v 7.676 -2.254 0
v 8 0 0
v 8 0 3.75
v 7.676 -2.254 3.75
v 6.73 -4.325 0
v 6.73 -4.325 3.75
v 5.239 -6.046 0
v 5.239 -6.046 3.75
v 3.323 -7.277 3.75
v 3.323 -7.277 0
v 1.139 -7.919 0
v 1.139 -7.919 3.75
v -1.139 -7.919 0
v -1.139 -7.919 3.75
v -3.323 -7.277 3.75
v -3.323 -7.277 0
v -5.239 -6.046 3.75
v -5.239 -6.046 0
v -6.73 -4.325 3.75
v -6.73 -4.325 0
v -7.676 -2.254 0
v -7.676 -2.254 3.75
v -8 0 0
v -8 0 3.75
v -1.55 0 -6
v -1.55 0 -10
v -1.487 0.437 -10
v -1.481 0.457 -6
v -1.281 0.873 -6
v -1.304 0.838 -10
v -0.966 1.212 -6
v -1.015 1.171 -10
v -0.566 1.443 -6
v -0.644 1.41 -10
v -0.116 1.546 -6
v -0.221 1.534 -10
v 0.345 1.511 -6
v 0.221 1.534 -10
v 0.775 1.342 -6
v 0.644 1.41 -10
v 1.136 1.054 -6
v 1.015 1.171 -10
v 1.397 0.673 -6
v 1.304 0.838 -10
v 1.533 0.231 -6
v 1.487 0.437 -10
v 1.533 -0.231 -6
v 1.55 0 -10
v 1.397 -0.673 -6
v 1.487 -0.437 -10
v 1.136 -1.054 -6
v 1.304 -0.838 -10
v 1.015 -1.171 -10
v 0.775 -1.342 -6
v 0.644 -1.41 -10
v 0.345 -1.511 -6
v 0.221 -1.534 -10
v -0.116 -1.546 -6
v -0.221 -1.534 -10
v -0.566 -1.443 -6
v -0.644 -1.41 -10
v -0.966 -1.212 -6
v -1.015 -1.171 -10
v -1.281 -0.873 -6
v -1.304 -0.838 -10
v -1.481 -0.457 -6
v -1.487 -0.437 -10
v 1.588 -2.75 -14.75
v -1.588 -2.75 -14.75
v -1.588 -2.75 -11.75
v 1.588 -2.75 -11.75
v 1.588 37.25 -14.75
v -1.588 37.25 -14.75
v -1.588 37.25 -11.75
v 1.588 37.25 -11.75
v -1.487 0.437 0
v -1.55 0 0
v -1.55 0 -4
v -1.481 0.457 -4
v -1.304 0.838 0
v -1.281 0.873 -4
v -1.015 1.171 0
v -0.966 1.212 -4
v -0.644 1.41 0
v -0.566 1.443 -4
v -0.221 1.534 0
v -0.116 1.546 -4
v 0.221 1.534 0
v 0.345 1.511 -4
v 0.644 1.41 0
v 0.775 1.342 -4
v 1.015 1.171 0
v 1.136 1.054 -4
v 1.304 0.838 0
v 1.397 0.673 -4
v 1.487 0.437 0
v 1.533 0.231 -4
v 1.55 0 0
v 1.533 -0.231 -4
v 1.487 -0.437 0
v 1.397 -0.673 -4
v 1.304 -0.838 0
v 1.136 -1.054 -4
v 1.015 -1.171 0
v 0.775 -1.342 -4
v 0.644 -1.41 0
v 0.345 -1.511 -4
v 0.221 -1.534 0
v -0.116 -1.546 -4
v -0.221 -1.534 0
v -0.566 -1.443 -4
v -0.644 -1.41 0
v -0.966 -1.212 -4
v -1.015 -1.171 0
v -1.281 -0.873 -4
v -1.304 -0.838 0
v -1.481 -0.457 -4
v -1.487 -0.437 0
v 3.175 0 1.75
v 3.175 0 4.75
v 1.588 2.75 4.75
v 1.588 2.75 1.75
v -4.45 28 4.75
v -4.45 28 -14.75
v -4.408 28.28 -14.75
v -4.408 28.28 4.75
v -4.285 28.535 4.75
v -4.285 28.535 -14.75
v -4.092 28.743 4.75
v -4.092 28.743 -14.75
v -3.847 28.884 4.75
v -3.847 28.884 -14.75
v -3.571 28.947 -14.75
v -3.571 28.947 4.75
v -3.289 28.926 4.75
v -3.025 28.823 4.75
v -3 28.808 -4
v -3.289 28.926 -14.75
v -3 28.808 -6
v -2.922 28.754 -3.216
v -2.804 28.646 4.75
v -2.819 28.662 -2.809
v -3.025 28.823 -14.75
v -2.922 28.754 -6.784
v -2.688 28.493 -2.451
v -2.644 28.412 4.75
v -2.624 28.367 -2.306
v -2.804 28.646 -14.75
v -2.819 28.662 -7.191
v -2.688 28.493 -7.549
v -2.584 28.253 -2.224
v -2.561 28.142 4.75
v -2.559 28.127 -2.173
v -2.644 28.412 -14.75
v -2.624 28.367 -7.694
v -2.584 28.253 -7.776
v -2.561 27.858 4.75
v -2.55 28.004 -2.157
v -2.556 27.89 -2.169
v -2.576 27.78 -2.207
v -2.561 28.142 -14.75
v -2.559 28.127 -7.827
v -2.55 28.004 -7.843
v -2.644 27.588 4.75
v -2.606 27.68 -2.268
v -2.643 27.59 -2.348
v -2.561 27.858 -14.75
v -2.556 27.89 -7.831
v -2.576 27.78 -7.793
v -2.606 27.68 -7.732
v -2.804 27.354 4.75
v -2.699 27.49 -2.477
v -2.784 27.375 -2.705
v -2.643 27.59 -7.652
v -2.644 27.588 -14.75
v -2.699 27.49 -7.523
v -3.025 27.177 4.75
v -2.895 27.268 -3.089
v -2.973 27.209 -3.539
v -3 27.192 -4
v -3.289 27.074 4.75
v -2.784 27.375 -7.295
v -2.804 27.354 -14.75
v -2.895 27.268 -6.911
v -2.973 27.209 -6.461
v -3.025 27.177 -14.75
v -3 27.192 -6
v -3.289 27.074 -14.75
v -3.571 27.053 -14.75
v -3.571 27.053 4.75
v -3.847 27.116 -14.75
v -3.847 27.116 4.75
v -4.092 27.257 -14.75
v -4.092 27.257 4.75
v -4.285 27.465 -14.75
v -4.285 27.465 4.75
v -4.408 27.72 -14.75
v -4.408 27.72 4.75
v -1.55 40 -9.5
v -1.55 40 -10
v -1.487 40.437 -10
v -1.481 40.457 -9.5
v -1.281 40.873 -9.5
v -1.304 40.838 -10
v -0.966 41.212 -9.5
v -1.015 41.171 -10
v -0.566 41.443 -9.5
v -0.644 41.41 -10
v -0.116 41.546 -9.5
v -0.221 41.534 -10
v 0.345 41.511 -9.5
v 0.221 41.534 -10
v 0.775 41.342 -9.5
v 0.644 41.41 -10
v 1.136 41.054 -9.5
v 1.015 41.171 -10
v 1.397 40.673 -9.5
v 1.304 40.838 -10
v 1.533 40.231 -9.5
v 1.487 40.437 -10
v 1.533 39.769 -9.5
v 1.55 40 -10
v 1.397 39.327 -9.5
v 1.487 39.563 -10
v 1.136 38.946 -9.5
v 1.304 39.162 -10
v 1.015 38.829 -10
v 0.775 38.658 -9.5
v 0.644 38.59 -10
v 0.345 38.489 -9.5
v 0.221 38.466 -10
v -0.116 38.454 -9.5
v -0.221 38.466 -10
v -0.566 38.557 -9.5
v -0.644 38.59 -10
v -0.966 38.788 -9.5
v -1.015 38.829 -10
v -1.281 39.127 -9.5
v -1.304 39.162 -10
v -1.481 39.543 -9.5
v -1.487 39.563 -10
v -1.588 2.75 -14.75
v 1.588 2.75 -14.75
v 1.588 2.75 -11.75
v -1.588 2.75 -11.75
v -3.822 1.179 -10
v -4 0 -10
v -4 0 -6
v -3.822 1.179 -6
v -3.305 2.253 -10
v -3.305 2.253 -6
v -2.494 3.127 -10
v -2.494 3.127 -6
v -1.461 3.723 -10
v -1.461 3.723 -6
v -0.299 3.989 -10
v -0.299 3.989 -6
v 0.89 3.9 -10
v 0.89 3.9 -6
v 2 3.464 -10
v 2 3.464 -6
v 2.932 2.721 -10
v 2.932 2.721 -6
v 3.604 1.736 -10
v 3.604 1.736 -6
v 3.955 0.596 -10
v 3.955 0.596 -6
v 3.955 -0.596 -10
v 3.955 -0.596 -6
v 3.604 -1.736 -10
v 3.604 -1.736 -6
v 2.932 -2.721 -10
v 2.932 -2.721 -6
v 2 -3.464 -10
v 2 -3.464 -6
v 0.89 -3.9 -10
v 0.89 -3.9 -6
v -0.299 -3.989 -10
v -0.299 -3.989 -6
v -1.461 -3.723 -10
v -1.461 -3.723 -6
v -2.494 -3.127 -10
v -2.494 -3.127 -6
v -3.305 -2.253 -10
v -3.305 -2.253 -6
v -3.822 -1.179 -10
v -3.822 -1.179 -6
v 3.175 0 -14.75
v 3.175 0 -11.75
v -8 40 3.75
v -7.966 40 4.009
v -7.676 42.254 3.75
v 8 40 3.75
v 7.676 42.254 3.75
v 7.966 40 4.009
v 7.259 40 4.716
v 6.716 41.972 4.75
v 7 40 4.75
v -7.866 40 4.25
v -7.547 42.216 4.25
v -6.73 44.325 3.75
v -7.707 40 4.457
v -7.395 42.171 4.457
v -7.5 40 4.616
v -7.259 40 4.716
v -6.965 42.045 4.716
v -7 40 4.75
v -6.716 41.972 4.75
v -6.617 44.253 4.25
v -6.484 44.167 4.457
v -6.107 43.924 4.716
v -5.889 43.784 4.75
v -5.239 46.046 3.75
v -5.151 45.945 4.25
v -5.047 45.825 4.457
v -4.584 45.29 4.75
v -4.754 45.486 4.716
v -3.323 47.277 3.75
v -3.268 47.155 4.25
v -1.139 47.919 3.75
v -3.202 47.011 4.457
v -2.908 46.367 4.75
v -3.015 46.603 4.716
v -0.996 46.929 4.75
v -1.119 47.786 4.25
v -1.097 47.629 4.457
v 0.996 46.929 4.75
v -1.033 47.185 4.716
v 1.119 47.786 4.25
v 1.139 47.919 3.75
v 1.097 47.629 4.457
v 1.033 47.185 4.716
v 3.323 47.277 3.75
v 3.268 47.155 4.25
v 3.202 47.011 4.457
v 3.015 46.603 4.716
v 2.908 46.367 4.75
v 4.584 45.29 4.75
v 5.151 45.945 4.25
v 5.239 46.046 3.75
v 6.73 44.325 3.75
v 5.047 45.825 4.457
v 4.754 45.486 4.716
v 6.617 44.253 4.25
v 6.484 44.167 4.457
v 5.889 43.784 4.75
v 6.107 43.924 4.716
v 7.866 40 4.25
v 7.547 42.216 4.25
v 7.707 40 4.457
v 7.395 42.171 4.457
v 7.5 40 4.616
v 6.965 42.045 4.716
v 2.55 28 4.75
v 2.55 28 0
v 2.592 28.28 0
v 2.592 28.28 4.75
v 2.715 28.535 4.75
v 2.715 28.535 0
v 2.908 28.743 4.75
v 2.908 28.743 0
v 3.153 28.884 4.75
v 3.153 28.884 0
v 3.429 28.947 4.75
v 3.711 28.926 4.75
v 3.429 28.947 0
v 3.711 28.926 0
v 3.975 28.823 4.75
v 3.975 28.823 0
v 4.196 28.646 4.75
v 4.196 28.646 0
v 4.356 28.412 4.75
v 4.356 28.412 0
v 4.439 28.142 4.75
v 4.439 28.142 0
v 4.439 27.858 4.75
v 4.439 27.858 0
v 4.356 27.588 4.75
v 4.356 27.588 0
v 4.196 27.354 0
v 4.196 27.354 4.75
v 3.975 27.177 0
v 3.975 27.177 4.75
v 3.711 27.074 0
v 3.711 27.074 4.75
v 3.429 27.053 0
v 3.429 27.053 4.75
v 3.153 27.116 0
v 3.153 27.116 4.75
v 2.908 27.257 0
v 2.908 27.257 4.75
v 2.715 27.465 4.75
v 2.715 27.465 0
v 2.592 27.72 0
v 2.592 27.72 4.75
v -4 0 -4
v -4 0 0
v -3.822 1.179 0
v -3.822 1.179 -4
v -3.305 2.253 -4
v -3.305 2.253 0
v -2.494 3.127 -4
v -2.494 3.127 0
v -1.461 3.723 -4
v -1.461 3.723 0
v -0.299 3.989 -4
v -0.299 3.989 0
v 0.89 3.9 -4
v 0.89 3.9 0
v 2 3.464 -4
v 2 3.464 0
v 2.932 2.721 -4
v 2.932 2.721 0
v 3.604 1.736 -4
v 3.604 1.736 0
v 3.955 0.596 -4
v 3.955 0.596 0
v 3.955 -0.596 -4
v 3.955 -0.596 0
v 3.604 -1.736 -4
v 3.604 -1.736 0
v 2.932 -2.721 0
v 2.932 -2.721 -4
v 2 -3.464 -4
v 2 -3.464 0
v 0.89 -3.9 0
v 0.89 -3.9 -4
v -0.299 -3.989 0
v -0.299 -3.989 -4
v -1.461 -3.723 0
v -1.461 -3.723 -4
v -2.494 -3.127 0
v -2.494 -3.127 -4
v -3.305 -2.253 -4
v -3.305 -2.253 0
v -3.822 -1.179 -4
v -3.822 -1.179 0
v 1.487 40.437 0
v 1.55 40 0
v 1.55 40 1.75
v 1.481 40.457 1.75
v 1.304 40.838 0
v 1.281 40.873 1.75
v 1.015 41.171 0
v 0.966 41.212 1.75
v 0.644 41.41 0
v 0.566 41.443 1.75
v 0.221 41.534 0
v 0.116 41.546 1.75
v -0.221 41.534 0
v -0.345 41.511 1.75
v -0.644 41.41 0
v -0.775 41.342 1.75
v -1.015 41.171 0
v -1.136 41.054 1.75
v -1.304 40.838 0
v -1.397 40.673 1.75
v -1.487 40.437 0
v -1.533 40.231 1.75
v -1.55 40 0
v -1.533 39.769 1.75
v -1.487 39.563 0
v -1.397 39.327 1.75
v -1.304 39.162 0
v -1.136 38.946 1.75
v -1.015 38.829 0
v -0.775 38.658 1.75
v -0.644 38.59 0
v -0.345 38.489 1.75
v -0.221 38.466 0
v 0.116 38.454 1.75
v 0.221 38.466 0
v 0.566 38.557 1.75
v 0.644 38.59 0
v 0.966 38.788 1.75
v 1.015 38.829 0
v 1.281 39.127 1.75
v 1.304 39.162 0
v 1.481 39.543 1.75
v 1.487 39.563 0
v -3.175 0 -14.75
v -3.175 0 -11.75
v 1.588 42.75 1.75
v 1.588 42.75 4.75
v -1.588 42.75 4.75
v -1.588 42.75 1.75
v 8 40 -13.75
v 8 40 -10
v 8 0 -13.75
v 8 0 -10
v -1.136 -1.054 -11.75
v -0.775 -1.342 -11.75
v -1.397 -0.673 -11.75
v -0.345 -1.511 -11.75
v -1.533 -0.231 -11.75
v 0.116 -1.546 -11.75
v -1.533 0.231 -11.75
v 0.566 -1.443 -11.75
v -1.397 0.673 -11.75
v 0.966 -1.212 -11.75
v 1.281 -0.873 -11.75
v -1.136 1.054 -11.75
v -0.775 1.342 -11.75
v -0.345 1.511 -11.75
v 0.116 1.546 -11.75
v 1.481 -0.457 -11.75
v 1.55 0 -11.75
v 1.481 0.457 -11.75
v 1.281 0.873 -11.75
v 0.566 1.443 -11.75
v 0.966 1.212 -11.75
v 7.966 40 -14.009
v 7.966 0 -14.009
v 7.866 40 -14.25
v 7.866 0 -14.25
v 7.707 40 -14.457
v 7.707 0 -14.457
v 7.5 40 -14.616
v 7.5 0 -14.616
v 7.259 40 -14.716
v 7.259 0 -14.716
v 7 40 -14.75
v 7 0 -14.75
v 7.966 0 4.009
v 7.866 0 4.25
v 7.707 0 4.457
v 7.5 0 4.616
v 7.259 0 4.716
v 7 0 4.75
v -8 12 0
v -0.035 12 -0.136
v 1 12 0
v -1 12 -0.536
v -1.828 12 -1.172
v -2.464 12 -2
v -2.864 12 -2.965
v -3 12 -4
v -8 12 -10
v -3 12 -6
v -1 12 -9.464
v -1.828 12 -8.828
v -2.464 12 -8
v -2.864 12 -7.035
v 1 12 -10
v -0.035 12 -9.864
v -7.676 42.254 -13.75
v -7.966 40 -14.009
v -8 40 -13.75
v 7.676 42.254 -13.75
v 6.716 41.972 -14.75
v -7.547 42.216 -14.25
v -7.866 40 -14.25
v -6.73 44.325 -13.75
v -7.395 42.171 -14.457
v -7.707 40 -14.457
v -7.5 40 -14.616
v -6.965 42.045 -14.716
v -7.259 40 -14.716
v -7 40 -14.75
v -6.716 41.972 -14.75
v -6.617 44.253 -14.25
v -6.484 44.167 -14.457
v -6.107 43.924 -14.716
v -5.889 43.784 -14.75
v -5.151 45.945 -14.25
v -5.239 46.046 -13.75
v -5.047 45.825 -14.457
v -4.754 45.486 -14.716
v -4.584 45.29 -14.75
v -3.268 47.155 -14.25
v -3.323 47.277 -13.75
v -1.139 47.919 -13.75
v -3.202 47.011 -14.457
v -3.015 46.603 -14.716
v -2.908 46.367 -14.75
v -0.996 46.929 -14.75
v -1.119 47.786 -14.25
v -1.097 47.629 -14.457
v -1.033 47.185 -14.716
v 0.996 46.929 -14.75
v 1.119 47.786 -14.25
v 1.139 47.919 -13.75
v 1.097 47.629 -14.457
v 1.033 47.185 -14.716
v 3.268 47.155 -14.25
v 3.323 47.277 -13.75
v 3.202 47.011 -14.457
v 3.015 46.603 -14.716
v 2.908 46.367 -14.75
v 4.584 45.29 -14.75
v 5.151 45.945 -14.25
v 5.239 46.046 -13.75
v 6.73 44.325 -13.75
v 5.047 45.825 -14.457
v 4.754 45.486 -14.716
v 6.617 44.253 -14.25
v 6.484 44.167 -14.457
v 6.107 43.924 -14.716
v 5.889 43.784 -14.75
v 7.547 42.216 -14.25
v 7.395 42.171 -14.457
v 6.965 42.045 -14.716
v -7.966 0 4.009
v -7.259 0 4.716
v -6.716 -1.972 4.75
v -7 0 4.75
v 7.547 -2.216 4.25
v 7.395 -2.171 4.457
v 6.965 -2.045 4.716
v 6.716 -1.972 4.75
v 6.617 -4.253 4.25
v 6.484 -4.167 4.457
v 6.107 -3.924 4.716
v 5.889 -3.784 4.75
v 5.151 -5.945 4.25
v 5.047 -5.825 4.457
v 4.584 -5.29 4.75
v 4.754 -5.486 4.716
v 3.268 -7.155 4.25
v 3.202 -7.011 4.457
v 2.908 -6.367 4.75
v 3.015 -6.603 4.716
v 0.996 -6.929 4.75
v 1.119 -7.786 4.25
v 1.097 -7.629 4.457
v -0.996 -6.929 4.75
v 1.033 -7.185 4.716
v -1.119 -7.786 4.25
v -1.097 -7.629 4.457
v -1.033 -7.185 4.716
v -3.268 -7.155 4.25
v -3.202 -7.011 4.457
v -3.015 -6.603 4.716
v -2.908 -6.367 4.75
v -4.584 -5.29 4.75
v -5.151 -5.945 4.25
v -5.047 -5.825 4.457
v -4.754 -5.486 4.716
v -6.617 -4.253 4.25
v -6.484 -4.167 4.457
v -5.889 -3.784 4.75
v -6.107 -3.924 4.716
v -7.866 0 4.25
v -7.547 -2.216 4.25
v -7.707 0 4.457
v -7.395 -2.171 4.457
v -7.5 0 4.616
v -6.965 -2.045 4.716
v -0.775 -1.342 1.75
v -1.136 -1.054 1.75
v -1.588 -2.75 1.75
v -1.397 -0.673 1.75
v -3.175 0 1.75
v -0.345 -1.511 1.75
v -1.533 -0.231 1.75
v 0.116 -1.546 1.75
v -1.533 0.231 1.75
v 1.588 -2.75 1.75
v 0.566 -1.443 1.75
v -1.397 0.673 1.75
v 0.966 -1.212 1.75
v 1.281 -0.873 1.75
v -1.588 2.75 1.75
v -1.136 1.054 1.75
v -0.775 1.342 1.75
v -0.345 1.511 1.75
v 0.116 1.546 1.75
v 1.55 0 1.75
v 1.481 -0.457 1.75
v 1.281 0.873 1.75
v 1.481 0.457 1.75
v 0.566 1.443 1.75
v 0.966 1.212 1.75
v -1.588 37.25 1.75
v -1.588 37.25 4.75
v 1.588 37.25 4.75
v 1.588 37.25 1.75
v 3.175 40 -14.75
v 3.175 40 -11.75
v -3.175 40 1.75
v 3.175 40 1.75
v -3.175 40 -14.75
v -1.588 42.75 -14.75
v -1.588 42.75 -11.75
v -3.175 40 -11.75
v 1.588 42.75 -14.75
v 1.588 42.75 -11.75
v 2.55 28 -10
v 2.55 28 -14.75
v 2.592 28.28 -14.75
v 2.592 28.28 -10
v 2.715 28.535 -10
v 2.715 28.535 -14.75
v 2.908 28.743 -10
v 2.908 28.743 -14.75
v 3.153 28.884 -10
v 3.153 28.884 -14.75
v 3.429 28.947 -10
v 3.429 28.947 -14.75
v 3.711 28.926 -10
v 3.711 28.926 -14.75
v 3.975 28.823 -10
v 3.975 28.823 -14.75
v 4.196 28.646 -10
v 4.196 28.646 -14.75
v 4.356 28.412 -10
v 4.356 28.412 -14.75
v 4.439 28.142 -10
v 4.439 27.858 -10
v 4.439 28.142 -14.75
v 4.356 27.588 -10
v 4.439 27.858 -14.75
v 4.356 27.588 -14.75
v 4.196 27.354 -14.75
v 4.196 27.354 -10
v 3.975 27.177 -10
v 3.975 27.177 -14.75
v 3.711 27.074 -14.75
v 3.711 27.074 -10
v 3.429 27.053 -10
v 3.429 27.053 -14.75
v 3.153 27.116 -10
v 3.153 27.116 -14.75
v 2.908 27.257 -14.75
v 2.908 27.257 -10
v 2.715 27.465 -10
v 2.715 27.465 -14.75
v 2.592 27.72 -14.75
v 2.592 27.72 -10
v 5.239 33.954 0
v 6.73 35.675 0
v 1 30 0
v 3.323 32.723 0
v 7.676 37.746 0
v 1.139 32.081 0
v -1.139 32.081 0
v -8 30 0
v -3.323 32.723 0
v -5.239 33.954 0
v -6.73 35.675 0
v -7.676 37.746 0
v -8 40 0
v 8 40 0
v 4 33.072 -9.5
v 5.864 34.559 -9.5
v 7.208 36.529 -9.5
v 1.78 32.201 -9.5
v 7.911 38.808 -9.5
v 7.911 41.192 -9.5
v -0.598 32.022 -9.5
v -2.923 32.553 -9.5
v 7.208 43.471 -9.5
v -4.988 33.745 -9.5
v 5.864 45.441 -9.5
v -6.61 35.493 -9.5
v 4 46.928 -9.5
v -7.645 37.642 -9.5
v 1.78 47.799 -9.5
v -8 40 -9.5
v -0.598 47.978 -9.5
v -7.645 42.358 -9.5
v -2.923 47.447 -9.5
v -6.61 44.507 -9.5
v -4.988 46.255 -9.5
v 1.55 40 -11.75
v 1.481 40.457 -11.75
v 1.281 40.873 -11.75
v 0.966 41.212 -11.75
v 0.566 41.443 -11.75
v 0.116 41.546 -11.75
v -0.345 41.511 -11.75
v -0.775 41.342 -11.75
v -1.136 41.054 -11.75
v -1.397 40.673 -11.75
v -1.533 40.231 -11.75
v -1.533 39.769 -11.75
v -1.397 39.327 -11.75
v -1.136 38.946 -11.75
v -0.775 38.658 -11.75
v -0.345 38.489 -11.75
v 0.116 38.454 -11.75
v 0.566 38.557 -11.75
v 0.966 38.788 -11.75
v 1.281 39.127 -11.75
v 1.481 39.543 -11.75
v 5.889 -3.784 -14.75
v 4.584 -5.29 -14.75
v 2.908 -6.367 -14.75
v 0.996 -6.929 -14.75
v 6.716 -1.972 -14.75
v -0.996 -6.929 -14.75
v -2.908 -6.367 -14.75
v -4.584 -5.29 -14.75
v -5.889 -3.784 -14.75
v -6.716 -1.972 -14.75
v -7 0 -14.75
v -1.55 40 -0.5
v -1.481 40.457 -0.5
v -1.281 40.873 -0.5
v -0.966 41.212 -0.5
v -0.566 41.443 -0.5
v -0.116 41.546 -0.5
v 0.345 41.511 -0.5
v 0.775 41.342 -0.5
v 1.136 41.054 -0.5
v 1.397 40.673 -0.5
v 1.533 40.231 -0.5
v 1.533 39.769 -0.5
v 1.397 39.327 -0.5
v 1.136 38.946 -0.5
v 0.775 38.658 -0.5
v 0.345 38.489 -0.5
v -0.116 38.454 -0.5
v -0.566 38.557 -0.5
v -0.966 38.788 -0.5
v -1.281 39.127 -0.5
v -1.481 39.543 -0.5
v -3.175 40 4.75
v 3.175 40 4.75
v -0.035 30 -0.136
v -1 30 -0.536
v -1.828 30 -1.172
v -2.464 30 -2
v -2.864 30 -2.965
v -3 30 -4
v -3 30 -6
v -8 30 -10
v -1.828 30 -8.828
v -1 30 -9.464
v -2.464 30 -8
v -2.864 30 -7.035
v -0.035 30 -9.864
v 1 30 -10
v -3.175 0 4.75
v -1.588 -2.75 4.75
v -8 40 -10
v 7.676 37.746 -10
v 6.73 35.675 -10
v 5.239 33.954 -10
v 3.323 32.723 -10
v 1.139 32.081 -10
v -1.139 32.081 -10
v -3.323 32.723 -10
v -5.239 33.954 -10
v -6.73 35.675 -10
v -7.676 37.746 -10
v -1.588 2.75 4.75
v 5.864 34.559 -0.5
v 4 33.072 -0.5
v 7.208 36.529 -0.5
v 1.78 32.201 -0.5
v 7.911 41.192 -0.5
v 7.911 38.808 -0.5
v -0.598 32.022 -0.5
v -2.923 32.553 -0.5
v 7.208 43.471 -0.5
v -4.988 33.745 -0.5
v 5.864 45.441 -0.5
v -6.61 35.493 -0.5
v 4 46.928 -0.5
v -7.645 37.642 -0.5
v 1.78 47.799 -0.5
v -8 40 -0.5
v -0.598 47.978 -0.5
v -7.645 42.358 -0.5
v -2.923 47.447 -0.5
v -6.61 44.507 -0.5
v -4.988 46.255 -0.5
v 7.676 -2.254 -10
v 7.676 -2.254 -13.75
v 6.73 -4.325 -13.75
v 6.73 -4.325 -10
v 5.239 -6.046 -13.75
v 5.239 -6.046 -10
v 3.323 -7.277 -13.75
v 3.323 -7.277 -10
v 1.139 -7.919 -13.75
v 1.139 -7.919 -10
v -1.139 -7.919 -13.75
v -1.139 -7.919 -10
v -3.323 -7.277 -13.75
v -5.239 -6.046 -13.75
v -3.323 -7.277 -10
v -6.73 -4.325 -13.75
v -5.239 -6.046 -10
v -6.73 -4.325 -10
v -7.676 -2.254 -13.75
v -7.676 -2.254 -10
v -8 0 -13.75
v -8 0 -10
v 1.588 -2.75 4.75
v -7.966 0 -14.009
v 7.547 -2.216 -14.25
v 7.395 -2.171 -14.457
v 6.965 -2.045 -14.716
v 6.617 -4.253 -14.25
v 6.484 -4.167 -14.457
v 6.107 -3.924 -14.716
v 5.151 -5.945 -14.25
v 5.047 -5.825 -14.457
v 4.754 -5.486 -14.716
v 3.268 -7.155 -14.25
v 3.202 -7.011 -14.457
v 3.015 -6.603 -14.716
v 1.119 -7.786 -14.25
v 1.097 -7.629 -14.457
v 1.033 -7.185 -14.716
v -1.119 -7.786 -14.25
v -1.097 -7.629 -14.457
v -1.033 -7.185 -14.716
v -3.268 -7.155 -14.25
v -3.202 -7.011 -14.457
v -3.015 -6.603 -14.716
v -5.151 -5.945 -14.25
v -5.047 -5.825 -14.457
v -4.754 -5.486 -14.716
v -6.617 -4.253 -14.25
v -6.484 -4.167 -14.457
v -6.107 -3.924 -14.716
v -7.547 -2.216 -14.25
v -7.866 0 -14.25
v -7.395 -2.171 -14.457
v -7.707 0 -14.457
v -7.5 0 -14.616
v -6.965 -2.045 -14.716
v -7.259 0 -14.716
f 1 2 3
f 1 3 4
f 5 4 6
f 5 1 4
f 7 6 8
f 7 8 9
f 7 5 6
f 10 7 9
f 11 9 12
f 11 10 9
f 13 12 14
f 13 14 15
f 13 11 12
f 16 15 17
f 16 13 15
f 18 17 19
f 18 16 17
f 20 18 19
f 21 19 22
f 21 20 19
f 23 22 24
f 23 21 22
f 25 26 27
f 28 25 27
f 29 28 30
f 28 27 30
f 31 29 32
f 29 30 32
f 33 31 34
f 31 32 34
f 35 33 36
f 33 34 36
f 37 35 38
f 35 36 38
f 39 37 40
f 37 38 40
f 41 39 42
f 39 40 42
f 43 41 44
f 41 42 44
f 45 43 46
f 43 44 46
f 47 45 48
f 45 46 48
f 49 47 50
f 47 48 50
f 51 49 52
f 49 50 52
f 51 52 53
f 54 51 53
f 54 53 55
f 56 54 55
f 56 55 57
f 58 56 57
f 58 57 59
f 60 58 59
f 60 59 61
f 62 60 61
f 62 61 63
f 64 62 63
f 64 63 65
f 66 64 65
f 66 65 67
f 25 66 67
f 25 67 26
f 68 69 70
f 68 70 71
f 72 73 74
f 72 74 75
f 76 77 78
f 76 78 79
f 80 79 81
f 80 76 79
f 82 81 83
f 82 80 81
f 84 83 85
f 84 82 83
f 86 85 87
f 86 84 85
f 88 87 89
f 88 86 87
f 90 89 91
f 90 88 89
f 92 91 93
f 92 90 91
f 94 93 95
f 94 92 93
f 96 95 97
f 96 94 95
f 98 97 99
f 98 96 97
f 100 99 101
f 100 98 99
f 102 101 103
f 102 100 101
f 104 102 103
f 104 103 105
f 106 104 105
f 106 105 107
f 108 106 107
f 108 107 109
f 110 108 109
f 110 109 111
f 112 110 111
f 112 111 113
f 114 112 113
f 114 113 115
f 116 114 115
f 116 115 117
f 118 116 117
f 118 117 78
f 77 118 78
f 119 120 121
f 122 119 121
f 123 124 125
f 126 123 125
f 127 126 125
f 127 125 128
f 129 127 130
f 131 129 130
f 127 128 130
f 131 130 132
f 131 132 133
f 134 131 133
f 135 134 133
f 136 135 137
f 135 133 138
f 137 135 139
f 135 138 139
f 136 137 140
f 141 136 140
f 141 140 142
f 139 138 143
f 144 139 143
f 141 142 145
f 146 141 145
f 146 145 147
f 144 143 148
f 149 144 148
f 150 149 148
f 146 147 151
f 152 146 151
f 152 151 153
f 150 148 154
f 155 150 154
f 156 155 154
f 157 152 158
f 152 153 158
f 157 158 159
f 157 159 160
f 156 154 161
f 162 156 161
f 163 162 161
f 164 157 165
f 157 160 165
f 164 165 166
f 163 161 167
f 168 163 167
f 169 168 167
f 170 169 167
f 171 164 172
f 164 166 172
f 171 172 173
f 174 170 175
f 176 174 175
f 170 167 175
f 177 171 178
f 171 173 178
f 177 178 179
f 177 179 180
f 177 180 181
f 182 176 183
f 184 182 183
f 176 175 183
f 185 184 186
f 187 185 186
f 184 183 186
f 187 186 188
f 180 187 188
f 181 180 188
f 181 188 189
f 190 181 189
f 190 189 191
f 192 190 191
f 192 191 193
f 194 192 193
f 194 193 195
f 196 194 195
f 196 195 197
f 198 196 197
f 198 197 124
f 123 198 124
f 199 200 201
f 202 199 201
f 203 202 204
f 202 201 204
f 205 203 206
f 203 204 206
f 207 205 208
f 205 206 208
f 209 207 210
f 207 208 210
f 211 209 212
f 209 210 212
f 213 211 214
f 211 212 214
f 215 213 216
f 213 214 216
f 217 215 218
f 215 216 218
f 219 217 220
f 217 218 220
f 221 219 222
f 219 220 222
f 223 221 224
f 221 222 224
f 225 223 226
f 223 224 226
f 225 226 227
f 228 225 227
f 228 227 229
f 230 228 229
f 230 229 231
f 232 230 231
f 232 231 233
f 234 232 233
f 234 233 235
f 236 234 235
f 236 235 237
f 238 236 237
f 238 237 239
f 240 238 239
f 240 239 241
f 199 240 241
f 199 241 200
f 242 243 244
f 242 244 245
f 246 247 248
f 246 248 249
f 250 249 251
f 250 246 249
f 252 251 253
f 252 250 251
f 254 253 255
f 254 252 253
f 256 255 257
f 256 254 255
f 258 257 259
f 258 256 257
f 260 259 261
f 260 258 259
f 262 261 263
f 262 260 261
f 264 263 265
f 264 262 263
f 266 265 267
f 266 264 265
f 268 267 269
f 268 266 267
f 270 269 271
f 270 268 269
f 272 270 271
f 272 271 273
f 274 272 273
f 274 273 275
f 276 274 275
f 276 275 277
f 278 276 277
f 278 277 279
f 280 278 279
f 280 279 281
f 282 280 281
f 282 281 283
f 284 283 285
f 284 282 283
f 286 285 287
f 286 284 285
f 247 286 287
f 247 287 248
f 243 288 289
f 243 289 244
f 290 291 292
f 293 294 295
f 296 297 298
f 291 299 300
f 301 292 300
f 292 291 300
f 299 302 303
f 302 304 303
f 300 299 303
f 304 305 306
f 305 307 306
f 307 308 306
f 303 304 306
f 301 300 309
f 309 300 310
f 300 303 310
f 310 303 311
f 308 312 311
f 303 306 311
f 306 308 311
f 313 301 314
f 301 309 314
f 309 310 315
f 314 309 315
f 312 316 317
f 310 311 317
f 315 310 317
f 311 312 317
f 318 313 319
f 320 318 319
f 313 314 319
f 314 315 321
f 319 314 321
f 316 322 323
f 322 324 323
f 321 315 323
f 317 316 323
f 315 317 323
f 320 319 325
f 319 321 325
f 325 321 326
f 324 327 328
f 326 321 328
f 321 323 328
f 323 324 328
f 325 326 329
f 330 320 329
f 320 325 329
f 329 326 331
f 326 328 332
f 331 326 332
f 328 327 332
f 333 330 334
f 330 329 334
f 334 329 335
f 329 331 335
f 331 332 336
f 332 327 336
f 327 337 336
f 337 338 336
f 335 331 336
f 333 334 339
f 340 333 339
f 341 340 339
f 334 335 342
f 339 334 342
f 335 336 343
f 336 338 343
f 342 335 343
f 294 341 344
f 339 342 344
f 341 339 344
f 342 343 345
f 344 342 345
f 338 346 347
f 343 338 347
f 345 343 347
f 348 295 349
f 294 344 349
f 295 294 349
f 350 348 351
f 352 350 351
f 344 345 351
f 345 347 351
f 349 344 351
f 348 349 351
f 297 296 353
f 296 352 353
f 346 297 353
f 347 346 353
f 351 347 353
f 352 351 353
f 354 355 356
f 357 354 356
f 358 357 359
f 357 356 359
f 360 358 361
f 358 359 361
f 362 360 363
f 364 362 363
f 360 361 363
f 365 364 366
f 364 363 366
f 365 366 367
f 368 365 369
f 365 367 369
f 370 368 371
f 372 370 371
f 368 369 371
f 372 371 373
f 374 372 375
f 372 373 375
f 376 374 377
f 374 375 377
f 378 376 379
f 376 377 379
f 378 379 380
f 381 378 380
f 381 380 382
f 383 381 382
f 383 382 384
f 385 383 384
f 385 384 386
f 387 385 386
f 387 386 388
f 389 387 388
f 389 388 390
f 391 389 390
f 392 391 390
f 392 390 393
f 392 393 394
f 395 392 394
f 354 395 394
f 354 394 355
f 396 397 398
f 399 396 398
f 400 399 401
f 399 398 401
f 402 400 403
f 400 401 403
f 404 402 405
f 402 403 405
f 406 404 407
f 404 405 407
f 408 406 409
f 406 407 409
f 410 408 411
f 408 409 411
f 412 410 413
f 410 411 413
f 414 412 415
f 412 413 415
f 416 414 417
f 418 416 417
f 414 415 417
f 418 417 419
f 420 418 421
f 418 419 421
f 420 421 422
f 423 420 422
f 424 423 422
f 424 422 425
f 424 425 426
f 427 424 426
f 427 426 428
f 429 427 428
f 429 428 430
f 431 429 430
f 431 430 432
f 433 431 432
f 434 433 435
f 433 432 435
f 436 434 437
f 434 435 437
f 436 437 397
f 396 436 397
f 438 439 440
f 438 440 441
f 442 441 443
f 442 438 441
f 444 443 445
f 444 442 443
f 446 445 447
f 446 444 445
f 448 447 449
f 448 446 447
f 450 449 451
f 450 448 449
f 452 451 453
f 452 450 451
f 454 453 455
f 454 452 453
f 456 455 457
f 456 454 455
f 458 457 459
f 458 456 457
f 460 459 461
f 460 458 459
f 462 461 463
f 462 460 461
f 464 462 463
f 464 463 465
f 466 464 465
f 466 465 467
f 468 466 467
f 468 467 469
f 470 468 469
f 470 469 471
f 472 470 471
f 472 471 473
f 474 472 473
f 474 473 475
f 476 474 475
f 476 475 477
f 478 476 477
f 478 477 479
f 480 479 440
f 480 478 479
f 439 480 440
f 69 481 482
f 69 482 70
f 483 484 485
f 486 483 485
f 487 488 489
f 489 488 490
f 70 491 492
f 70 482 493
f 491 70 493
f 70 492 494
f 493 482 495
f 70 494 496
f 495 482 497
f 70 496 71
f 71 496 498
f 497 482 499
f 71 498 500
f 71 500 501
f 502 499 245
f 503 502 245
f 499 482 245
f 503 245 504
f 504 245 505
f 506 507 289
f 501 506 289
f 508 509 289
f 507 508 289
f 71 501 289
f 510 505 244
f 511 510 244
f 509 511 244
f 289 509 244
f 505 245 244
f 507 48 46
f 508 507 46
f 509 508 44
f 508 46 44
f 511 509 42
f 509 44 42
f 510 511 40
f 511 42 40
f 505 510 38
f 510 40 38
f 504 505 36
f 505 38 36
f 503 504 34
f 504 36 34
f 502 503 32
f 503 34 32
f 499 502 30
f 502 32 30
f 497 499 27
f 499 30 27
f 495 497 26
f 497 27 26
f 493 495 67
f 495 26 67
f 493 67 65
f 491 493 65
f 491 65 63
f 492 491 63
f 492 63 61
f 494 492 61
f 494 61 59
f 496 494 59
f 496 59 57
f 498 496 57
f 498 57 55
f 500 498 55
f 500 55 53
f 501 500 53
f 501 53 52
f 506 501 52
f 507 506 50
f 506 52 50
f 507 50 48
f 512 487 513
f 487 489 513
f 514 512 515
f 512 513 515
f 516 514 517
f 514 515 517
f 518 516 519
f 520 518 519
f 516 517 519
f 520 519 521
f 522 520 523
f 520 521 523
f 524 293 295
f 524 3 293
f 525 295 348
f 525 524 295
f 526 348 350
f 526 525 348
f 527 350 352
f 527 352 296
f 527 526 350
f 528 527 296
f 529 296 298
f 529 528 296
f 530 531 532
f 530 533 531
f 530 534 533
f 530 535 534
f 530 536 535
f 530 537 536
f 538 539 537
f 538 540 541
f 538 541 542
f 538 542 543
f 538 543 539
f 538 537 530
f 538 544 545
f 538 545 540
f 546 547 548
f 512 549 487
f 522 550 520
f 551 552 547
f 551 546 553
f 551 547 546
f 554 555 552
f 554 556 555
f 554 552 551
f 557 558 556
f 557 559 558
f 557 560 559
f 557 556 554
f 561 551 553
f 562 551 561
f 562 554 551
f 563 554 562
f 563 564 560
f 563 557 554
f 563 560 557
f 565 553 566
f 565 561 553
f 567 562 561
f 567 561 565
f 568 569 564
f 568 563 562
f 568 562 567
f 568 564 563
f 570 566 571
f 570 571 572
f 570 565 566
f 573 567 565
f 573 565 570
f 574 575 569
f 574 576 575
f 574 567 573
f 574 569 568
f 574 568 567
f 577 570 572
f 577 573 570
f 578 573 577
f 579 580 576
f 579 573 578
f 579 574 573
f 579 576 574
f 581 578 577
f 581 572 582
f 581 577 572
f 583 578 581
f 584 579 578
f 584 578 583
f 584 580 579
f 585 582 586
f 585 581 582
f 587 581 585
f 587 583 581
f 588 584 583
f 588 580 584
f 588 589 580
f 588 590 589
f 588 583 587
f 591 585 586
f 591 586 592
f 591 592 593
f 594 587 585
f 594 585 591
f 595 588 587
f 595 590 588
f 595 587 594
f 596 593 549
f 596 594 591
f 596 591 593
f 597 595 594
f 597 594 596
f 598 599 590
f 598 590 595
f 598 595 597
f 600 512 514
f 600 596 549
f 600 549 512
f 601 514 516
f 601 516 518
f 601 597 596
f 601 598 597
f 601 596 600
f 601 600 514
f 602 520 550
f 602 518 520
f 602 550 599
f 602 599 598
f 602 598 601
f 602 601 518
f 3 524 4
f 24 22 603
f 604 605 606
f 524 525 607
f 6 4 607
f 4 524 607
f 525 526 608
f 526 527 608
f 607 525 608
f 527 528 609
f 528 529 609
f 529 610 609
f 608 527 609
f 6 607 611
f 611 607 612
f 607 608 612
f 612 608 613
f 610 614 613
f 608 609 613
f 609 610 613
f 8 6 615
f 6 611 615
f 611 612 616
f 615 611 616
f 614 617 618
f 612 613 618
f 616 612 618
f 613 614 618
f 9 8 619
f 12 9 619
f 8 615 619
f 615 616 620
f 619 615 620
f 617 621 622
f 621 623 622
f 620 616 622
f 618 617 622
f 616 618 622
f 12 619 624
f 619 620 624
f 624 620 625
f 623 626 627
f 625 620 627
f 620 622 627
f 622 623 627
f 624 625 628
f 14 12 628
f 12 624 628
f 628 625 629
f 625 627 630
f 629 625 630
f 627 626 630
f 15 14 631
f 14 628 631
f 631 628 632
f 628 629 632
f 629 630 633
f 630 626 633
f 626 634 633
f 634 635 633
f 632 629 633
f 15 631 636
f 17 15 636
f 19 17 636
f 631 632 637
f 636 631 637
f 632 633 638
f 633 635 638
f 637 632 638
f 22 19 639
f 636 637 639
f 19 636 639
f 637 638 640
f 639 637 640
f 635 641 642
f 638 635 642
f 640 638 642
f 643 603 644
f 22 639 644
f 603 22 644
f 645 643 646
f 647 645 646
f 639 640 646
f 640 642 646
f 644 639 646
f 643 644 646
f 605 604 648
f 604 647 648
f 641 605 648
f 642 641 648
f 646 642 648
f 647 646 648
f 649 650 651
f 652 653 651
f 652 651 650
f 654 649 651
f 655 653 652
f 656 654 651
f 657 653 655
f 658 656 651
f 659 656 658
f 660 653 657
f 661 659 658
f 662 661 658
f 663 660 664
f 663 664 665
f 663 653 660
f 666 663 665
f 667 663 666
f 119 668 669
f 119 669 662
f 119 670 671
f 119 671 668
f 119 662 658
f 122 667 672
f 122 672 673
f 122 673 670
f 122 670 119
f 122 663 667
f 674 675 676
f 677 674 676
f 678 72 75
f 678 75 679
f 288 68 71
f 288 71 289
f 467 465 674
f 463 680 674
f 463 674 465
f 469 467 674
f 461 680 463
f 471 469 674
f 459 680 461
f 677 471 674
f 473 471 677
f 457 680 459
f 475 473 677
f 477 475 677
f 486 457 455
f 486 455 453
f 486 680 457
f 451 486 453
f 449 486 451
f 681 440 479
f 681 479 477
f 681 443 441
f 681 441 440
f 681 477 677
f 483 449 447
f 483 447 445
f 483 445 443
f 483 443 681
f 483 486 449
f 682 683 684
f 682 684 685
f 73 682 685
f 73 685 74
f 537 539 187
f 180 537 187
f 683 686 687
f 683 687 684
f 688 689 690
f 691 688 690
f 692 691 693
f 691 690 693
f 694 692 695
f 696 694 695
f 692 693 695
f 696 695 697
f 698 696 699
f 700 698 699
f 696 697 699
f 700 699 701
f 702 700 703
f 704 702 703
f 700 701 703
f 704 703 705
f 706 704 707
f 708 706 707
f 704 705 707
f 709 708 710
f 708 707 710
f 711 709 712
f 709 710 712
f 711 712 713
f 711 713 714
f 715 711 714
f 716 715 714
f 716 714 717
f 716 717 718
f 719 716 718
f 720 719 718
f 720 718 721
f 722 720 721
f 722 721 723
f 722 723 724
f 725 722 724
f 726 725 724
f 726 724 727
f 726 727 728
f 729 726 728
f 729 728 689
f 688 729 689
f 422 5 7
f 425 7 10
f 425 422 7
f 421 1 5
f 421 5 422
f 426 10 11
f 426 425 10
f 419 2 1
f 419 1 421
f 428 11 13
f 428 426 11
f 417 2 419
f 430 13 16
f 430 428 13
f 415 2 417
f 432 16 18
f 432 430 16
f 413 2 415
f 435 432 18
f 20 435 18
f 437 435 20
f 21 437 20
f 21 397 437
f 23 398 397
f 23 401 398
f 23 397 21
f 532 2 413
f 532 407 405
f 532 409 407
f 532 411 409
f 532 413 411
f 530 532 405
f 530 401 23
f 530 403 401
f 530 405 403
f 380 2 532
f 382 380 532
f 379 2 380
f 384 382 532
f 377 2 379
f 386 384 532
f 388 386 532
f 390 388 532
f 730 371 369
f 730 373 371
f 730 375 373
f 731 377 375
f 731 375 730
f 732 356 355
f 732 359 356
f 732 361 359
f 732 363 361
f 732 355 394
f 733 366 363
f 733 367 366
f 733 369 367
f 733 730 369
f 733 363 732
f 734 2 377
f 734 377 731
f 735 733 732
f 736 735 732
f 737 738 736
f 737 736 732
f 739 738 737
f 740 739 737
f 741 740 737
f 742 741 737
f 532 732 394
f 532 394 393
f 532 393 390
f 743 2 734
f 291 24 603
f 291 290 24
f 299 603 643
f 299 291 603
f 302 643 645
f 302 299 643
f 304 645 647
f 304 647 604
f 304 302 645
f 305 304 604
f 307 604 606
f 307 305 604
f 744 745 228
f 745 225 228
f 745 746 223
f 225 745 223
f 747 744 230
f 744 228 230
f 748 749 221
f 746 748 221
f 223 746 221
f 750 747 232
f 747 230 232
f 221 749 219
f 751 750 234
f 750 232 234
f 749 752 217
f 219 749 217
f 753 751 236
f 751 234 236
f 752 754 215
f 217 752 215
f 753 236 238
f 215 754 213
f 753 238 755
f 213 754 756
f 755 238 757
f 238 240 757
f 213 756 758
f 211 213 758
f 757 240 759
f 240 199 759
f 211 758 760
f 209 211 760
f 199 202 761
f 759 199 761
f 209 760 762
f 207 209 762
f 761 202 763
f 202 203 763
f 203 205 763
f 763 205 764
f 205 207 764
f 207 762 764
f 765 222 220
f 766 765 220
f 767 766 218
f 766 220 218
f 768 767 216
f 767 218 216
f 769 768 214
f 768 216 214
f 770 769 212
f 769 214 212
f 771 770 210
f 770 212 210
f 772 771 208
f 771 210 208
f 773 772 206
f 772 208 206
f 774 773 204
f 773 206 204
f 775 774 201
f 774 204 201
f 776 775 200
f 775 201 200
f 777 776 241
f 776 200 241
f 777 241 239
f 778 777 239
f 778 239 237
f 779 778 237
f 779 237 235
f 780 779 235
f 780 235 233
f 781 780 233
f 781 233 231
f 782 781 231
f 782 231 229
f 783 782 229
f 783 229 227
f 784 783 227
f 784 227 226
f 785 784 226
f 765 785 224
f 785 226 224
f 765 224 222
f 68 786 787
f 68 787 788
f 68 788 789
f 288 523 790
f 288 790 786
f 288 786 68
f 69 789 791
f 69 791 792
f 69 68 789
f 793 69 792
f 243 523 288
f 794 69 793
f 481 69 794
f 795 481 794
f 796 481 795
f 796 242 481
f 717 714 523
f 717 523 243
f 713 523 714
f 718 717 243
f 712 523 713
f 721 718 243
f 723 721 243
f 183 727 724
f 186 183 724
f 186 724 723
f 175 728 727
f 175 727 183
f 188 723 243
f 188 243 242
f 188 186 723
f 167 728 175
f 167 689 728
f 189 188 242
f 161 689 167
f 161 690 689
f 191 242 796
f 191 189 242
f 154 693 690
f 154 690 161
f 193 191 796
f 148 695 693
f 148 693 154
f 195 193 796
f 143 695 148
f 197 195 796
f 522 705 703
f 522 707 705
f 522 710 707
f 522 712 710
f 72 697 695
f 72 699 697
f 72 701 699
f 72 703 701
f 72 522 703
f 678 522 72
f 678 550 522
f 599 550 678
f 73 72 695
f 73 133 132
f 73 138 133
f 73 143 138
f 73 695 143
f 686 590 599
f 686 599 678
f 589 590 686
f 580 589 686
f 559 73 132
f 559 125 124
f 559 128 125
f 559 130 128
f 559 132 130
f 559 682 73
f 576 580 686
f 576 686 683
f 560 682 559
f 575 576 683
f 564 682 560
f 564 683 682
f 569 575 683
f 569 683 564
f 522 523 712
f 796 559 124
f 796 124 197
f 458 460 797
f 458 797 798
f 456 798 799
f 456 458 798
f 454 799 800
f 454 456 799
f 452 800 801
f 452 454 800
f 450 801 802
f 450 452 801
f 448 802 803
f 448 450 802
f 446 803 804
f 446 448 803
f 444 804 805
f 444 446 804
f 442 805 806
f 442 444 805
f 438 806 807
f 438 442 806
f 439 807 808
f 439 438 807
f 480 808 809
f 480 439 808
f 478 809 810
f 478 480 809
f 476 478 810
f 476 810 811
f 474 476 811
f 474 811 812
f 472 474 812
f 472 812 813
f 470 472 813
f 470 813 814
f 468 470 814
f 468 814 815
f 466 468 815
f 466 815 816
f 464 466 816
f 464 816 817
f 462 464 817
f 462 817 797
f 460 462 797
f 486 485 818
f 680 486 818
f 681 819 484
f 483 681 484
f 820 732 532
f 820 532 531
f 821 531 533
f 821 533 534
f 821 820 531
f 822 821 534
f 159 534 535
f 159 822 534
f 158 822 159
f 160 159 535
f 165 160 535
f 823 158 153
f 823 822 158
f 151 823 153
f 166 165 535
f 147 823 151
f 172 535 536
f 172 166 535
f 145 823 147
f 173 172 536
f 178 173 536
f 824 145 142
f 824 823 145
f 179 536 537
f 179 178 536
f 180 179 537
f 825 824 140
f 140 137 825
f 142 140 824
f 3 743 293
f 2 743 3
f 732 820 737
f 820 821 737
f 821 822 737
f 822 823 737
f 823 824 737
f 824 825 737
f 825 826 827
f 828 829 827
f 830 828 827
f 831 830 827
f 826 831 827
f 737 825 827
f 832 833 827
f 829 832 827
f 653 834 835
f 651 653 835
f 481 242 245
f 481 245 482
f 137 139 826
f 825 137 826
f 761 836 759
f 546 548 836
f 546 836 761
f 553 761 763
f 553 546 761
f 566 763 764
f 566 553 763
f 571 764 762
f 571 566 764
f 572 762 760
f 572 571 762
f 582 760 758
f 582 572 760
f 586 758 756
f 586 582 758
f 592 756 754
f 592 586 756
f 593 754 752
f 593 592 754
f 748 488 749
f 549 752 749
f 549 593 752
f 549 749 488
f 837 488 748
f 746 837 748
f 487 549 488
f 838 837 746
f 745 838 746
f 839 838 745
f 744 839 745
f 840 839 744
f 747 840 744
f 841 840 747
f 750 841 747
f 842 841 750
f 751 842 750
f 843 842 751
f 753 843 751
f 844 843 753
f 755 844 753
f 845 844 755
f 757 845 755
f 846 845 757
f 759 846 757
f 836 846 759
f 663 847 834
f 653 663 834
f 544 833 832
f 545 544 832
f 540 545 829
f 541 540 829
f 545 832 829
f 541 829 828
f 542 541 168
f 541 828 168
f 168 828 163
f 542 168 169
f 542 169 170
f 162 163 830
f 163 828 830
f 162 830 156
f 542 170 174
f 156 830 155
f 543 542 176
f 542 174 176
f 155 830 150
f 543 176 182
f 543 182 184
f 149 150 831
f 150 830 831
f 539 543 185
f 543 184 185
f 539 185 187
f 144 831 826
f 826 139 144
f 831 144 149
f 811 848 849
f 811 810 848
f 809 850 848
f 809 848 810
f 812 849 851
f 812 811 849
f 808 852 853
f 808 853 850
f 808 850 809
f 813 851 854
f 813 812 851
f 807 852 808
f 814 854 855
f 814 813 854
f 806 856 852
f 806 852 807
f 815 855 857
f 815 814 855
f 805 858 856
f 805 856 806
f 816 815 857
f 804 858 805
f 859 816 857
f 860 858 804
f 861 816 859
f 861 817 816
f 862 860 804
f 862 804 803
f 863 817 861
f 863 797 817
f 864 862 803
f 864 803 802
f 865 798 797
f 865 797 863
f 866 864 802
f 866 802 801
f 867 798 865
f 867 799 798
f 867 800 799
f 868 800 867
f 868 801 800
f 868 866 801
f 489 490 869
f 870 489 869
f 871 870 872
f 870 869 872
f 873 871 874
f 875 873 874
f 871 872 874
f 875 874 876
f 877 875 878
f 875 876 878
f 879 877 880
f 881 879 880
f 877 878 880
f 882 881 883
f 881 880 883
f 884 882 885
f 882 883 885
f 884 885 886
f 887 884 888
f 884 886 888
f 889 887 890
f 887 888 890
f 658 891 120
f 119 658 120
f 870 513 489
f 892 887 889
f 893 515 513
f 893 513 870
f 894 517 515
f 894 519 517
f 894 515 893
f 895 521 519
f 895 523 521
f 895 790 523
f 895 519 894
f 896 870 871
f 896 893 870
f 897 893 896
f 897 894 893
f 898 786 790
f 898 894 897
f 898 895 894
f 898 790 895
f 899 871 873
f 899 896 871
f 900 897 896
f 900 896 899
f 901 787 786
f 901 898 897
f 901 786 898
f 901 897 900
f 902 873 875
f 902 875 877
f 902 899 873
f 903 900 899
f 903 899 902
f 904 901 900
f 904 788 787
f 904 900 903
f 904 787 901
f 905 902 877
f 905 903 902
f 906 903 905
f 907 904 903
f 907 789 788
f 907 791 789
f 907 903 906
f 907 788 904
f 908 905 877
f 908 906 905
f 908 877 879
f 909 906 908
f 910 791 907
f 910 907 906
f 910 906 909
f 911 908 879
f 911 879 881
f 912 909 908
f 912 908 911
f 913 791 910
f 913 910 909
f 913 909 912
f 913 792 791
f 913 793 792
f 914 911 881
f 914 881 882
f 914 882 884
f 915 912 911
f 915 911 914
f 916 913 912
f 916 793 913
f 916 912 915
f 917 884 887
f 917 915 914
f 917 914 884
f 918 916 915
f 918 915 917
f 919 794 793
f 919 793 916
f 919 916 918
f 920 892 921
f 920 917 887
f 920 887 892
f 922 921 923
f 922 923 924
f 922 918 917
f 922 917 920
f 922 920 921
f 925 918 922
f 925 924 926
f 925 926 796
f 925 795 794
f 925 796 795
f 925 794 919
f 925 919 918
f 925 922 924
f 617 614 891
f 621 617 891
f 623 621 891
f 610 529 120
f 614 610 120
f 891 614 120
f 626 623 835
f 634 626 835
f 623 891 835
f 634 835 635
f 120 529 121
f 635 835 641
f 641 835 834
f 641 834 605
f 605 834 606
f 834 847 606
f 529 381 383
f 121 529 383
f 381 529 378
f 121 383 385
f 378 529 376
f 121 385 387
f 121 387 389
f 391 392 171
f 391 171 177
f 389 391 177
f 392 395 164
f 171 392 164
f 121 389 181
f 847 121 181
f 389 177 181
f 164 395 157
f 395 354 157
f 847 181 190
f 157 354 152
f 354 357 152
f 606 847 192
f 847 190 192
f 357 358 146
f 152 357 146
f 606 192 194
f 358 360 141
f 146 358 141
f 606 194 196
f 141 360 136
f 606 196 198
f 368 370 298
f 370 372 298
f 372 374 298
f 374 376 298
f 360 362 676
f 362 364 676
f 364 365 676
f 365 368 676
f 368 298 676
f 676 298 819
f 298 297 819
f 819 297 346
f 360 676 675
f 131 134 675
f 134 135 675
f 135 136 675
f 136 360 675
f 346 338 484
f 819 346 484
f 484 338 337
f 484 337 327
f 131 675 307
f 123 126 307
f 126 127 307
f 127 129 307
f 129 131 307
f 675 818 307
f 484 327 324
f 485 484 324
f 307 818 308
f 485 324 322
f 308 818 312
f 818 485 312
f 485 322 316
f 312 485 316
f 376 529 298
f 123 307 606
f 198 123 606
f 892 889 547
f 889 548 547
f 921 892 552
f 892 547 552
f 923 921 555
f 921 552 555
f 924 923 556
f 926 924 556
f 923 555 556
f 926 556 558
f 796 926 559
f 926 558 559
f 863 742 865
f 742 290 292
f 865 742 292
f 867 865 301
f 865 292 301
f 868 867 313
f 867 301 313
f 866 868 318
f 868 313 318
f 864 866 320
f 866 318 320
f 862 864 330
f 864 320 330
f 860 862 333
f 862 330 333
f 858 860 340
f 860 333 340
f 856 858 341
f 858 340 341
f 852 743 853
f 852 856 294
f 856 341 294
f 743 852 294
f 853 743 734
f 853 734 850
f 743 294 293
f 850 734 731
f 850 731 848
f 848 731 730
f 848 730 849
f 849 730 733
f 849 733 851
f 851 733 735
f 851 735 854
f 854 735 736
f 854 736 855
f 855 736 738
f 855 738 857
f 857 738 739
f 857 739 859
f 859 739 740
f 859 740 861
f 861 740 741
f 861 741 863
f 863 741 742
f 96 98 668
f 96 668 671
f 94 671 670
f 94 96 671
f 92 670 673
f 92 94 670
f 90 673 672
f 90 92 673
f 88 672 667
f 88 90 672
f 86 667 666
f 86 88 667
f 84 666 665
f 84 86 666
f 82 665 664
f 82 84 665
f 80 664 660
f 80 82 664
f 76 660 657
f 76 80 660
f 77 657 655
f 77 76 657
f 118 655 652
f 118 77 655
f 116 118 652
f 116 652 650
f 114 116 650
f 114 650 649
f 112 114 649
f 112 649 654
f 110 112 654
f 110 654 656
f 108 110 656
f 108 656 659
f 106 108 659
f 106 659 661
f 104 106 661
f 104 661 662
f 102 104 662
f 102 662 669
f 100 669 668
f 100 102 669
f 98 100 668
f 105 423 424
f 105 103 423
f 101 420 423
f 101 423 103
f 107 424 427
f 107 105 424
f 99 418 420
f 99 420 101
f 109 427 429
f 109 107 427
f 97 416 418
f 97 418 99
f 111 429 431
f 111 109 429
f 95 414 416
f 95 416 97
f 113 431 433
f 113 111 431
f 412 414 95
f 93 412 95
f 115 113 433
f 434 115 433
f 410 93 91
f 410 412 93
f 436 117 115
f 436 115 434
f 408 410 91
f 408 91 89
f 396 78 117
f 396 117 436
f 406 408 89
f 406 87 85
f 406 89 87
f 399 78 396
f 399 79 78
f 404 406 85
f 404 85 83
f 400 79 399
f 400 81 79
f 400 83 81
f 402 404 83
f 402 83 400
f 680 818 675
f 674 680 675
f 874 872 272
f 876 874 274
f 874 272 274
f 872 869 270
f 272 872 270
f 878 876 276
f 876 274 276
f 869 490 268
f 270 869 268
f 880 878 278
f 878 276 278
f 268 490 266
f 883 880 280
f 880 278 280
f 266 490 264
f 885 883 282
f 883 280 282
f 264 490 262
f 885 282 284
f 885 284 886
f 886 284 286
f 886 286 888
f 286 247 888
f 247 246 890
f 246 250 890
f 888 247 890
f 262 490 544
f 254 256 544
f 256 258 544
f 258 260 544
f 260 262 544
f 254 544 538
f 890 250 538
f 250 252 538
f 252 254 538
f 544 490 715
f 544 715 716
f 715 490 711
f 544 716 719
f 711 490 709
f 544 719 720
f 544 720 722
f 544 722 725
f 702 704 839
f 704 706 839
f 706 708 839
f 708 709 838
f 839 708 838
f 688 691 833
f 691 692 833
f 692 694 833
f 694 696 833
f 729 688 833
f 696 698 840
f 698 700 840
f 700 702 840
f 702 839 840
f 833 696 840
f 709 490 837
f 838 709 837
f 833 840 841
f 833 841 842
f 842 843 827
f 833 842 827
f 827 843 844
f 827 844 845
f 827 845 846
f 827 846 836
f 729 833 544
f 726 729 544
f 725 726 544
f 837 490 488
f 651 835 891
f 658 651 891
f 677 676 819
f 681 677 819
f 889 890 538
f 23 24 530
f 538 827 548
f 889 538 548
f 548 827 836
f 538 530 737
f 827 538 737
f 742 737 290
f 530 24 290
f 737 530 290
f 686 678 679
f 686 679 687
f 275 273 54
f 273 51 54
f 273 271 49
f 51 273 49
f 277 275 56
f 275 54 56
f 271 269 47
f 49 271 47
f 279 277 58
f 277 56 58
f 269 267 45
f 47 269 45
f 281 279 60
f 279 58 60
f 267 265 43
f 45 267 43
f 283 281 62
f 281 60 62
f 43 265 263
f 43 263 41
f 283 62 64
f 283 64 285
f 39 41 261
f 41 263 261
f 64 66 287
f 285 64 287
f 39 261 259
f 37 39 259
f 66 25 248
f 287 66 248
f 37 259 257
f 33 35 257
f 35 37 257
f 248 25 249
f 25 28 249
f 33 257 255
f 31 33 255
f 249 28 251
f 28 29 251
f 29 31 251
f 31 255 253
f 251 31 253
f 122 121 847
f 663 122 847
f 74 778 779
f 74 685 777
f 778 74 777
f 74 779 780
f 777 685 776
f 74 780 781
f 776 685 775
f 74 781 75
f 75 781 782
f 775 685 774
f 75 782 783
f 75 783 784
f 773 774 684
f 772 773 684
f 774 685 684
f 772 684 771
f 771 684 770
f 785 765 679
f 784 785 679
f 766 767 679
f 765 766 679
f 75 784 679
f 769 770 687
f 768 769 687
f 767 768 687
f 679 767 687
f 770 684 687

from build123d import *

# Parameters (mm, degrees)
SKETCH1_R           = 1.55
BOSS_EXTRUDE1_DEPTH = 4.75
FILLET2_R           = 1
CUT_EXTRUDE1_DEPTH  = 3
SKETCH3_W           = 5
SKETCH3_H           = 18
BOSS_EXTRUDE2_DEPTH = 5
SKETCH8_R           = 4
SKETCH8_R_2         = 1.55
BOSS_EXTRUDE4_DEPTH = 4
SKETCH9_R           = 8
SKETCH9_R_2         = 1.55
BOSS_EXTRUDE5_DEPTH = 0.5
FILLET3_R           = 4
SKETCH7_R           = 0.95
CUT_EXTRUDE3_DEPTH  = 20.5


with BuildPart() as part:
    # Sketch1 → Boss-Extrude1 (new body)
    with BuildSketch(Plane.XY):
        with BuildLine():
            Line((-8, 0), (-8, 40))
            ThreePointArc((-8, 40), (0, 48), (8, 40))
            Line((8, 40), (8, 0))
            ThreePointArc((8, 0), (0, -8), (-8, 0))
        make_face()
        with Locations((0, 40)):
            Circle(SKETCH1_R, mode=Mode.SUBTRACT)
        Circle(SKETCH1_R, mode=Mode.SUBTRACT)
    extrude(amount=BOSS_EXTRUDE1_DEPTH)

    # Fillet2
    fillet2_edges = [part.edges().sort_by_distance(p)[0] for p in [
        (0, 48, 4.75),
        (-8, 20, 4.75),
        (0, -8, 4.75),
        (8, 20, 4.75),
    ]]
    fillet(fillet2_edges, radius=FILLET2_R)

    # Sketch2 → Cut-Extrude1 (cut)
    with BuildSketch(Plane.XY.offset(4.75)):
        Polygon((3.175426481, 40), (1.58771324, 42.75), (-1.58771324, 42.75), (-3.175426481, 40), (-1.58771324, 37.25), (1.58771324, 37.25), align=None)
        Polygon((3.175426481, 0), (1.58771324, 2.75), (-1.58771324, 2.75), (-3.175426481, 0), (-1.58771324, -2.75), (1.58771324, -2.75), align=None)
    extrude(amount=-CUT_EXTRUDE1_DEPTH, mode=Mode.SUBTRACT)

    # Sketch3 → Boss-Extrude2 (add)
    with BuildSketch(Plane(origin=(0, 0, 0), x_dir=(-1, 0, 0), z_dir=(0, 0, -1))):
        with Locations((5.5, 21)):
            Rectangle(SKETCH3_W, SKETCH3_H)
    extrude(amount=BOSS_EXTRUDE2_DEPTH)

    # Sketch8 → Boss-Extrude4 (add)
    with BuildSketch(Plane(origin=(0, 0, 0), x_dir=(-1, 0, 0), z_dir=(0, 0, -1))):
        Circle(SKETCH8_R)
        Circle(SKETCH8_R_2, mode=Mode.SUBTRACT)
    extrude(amount=BOSS_EXTRUDE4_DEPTH)

    # Sketch9 → Boss-Extrude5 (add)
    with BuildSketch(Plane(origin=(0, 0, 0), x_dir=(-1, 0, 0), z_dir=(0, 0, -1))):
        with Locations((0, 40)):
            Circle(SKETCH9_R)
        with Locations((0, 40)):
            Circle(SKETCH9_R_2, mode=Mode.SUBTRACT)
    extrude(amount=BOSS_EXTRUDE5_DEPTH)

    # Fillet3
    fillet3_edges = [part.edges().sort_by_distance(p)[0] for p in [
        (-3, 21, 0),
    ]]
    fillet(fillet3_edges, radius=FILLET3_R)

    # Mirror5: part across plane


with BuildPart() as part_1:
    add(part.part)
    add(part.part.mirror(Plane.XY.offset(-5)))

    # Sketch7 → Cut-Extrude3 (cut, through all)
    with BuildSketch(Plane(origin=(0, 0, -14.75), x_dir=(-1, 0, 0), z_dir=(0, 0, -1))):
        with Locations((-3.5, 28)):
            Circle(SKETCH7_R)
        with Locations((3.5, 28)):
            Circle(SKETCH7_R)
    extrude(amount=-CUT_EXTRUDE3_DEPTH, mode=Mode.SUBTRACT)


solid = part_1.part
